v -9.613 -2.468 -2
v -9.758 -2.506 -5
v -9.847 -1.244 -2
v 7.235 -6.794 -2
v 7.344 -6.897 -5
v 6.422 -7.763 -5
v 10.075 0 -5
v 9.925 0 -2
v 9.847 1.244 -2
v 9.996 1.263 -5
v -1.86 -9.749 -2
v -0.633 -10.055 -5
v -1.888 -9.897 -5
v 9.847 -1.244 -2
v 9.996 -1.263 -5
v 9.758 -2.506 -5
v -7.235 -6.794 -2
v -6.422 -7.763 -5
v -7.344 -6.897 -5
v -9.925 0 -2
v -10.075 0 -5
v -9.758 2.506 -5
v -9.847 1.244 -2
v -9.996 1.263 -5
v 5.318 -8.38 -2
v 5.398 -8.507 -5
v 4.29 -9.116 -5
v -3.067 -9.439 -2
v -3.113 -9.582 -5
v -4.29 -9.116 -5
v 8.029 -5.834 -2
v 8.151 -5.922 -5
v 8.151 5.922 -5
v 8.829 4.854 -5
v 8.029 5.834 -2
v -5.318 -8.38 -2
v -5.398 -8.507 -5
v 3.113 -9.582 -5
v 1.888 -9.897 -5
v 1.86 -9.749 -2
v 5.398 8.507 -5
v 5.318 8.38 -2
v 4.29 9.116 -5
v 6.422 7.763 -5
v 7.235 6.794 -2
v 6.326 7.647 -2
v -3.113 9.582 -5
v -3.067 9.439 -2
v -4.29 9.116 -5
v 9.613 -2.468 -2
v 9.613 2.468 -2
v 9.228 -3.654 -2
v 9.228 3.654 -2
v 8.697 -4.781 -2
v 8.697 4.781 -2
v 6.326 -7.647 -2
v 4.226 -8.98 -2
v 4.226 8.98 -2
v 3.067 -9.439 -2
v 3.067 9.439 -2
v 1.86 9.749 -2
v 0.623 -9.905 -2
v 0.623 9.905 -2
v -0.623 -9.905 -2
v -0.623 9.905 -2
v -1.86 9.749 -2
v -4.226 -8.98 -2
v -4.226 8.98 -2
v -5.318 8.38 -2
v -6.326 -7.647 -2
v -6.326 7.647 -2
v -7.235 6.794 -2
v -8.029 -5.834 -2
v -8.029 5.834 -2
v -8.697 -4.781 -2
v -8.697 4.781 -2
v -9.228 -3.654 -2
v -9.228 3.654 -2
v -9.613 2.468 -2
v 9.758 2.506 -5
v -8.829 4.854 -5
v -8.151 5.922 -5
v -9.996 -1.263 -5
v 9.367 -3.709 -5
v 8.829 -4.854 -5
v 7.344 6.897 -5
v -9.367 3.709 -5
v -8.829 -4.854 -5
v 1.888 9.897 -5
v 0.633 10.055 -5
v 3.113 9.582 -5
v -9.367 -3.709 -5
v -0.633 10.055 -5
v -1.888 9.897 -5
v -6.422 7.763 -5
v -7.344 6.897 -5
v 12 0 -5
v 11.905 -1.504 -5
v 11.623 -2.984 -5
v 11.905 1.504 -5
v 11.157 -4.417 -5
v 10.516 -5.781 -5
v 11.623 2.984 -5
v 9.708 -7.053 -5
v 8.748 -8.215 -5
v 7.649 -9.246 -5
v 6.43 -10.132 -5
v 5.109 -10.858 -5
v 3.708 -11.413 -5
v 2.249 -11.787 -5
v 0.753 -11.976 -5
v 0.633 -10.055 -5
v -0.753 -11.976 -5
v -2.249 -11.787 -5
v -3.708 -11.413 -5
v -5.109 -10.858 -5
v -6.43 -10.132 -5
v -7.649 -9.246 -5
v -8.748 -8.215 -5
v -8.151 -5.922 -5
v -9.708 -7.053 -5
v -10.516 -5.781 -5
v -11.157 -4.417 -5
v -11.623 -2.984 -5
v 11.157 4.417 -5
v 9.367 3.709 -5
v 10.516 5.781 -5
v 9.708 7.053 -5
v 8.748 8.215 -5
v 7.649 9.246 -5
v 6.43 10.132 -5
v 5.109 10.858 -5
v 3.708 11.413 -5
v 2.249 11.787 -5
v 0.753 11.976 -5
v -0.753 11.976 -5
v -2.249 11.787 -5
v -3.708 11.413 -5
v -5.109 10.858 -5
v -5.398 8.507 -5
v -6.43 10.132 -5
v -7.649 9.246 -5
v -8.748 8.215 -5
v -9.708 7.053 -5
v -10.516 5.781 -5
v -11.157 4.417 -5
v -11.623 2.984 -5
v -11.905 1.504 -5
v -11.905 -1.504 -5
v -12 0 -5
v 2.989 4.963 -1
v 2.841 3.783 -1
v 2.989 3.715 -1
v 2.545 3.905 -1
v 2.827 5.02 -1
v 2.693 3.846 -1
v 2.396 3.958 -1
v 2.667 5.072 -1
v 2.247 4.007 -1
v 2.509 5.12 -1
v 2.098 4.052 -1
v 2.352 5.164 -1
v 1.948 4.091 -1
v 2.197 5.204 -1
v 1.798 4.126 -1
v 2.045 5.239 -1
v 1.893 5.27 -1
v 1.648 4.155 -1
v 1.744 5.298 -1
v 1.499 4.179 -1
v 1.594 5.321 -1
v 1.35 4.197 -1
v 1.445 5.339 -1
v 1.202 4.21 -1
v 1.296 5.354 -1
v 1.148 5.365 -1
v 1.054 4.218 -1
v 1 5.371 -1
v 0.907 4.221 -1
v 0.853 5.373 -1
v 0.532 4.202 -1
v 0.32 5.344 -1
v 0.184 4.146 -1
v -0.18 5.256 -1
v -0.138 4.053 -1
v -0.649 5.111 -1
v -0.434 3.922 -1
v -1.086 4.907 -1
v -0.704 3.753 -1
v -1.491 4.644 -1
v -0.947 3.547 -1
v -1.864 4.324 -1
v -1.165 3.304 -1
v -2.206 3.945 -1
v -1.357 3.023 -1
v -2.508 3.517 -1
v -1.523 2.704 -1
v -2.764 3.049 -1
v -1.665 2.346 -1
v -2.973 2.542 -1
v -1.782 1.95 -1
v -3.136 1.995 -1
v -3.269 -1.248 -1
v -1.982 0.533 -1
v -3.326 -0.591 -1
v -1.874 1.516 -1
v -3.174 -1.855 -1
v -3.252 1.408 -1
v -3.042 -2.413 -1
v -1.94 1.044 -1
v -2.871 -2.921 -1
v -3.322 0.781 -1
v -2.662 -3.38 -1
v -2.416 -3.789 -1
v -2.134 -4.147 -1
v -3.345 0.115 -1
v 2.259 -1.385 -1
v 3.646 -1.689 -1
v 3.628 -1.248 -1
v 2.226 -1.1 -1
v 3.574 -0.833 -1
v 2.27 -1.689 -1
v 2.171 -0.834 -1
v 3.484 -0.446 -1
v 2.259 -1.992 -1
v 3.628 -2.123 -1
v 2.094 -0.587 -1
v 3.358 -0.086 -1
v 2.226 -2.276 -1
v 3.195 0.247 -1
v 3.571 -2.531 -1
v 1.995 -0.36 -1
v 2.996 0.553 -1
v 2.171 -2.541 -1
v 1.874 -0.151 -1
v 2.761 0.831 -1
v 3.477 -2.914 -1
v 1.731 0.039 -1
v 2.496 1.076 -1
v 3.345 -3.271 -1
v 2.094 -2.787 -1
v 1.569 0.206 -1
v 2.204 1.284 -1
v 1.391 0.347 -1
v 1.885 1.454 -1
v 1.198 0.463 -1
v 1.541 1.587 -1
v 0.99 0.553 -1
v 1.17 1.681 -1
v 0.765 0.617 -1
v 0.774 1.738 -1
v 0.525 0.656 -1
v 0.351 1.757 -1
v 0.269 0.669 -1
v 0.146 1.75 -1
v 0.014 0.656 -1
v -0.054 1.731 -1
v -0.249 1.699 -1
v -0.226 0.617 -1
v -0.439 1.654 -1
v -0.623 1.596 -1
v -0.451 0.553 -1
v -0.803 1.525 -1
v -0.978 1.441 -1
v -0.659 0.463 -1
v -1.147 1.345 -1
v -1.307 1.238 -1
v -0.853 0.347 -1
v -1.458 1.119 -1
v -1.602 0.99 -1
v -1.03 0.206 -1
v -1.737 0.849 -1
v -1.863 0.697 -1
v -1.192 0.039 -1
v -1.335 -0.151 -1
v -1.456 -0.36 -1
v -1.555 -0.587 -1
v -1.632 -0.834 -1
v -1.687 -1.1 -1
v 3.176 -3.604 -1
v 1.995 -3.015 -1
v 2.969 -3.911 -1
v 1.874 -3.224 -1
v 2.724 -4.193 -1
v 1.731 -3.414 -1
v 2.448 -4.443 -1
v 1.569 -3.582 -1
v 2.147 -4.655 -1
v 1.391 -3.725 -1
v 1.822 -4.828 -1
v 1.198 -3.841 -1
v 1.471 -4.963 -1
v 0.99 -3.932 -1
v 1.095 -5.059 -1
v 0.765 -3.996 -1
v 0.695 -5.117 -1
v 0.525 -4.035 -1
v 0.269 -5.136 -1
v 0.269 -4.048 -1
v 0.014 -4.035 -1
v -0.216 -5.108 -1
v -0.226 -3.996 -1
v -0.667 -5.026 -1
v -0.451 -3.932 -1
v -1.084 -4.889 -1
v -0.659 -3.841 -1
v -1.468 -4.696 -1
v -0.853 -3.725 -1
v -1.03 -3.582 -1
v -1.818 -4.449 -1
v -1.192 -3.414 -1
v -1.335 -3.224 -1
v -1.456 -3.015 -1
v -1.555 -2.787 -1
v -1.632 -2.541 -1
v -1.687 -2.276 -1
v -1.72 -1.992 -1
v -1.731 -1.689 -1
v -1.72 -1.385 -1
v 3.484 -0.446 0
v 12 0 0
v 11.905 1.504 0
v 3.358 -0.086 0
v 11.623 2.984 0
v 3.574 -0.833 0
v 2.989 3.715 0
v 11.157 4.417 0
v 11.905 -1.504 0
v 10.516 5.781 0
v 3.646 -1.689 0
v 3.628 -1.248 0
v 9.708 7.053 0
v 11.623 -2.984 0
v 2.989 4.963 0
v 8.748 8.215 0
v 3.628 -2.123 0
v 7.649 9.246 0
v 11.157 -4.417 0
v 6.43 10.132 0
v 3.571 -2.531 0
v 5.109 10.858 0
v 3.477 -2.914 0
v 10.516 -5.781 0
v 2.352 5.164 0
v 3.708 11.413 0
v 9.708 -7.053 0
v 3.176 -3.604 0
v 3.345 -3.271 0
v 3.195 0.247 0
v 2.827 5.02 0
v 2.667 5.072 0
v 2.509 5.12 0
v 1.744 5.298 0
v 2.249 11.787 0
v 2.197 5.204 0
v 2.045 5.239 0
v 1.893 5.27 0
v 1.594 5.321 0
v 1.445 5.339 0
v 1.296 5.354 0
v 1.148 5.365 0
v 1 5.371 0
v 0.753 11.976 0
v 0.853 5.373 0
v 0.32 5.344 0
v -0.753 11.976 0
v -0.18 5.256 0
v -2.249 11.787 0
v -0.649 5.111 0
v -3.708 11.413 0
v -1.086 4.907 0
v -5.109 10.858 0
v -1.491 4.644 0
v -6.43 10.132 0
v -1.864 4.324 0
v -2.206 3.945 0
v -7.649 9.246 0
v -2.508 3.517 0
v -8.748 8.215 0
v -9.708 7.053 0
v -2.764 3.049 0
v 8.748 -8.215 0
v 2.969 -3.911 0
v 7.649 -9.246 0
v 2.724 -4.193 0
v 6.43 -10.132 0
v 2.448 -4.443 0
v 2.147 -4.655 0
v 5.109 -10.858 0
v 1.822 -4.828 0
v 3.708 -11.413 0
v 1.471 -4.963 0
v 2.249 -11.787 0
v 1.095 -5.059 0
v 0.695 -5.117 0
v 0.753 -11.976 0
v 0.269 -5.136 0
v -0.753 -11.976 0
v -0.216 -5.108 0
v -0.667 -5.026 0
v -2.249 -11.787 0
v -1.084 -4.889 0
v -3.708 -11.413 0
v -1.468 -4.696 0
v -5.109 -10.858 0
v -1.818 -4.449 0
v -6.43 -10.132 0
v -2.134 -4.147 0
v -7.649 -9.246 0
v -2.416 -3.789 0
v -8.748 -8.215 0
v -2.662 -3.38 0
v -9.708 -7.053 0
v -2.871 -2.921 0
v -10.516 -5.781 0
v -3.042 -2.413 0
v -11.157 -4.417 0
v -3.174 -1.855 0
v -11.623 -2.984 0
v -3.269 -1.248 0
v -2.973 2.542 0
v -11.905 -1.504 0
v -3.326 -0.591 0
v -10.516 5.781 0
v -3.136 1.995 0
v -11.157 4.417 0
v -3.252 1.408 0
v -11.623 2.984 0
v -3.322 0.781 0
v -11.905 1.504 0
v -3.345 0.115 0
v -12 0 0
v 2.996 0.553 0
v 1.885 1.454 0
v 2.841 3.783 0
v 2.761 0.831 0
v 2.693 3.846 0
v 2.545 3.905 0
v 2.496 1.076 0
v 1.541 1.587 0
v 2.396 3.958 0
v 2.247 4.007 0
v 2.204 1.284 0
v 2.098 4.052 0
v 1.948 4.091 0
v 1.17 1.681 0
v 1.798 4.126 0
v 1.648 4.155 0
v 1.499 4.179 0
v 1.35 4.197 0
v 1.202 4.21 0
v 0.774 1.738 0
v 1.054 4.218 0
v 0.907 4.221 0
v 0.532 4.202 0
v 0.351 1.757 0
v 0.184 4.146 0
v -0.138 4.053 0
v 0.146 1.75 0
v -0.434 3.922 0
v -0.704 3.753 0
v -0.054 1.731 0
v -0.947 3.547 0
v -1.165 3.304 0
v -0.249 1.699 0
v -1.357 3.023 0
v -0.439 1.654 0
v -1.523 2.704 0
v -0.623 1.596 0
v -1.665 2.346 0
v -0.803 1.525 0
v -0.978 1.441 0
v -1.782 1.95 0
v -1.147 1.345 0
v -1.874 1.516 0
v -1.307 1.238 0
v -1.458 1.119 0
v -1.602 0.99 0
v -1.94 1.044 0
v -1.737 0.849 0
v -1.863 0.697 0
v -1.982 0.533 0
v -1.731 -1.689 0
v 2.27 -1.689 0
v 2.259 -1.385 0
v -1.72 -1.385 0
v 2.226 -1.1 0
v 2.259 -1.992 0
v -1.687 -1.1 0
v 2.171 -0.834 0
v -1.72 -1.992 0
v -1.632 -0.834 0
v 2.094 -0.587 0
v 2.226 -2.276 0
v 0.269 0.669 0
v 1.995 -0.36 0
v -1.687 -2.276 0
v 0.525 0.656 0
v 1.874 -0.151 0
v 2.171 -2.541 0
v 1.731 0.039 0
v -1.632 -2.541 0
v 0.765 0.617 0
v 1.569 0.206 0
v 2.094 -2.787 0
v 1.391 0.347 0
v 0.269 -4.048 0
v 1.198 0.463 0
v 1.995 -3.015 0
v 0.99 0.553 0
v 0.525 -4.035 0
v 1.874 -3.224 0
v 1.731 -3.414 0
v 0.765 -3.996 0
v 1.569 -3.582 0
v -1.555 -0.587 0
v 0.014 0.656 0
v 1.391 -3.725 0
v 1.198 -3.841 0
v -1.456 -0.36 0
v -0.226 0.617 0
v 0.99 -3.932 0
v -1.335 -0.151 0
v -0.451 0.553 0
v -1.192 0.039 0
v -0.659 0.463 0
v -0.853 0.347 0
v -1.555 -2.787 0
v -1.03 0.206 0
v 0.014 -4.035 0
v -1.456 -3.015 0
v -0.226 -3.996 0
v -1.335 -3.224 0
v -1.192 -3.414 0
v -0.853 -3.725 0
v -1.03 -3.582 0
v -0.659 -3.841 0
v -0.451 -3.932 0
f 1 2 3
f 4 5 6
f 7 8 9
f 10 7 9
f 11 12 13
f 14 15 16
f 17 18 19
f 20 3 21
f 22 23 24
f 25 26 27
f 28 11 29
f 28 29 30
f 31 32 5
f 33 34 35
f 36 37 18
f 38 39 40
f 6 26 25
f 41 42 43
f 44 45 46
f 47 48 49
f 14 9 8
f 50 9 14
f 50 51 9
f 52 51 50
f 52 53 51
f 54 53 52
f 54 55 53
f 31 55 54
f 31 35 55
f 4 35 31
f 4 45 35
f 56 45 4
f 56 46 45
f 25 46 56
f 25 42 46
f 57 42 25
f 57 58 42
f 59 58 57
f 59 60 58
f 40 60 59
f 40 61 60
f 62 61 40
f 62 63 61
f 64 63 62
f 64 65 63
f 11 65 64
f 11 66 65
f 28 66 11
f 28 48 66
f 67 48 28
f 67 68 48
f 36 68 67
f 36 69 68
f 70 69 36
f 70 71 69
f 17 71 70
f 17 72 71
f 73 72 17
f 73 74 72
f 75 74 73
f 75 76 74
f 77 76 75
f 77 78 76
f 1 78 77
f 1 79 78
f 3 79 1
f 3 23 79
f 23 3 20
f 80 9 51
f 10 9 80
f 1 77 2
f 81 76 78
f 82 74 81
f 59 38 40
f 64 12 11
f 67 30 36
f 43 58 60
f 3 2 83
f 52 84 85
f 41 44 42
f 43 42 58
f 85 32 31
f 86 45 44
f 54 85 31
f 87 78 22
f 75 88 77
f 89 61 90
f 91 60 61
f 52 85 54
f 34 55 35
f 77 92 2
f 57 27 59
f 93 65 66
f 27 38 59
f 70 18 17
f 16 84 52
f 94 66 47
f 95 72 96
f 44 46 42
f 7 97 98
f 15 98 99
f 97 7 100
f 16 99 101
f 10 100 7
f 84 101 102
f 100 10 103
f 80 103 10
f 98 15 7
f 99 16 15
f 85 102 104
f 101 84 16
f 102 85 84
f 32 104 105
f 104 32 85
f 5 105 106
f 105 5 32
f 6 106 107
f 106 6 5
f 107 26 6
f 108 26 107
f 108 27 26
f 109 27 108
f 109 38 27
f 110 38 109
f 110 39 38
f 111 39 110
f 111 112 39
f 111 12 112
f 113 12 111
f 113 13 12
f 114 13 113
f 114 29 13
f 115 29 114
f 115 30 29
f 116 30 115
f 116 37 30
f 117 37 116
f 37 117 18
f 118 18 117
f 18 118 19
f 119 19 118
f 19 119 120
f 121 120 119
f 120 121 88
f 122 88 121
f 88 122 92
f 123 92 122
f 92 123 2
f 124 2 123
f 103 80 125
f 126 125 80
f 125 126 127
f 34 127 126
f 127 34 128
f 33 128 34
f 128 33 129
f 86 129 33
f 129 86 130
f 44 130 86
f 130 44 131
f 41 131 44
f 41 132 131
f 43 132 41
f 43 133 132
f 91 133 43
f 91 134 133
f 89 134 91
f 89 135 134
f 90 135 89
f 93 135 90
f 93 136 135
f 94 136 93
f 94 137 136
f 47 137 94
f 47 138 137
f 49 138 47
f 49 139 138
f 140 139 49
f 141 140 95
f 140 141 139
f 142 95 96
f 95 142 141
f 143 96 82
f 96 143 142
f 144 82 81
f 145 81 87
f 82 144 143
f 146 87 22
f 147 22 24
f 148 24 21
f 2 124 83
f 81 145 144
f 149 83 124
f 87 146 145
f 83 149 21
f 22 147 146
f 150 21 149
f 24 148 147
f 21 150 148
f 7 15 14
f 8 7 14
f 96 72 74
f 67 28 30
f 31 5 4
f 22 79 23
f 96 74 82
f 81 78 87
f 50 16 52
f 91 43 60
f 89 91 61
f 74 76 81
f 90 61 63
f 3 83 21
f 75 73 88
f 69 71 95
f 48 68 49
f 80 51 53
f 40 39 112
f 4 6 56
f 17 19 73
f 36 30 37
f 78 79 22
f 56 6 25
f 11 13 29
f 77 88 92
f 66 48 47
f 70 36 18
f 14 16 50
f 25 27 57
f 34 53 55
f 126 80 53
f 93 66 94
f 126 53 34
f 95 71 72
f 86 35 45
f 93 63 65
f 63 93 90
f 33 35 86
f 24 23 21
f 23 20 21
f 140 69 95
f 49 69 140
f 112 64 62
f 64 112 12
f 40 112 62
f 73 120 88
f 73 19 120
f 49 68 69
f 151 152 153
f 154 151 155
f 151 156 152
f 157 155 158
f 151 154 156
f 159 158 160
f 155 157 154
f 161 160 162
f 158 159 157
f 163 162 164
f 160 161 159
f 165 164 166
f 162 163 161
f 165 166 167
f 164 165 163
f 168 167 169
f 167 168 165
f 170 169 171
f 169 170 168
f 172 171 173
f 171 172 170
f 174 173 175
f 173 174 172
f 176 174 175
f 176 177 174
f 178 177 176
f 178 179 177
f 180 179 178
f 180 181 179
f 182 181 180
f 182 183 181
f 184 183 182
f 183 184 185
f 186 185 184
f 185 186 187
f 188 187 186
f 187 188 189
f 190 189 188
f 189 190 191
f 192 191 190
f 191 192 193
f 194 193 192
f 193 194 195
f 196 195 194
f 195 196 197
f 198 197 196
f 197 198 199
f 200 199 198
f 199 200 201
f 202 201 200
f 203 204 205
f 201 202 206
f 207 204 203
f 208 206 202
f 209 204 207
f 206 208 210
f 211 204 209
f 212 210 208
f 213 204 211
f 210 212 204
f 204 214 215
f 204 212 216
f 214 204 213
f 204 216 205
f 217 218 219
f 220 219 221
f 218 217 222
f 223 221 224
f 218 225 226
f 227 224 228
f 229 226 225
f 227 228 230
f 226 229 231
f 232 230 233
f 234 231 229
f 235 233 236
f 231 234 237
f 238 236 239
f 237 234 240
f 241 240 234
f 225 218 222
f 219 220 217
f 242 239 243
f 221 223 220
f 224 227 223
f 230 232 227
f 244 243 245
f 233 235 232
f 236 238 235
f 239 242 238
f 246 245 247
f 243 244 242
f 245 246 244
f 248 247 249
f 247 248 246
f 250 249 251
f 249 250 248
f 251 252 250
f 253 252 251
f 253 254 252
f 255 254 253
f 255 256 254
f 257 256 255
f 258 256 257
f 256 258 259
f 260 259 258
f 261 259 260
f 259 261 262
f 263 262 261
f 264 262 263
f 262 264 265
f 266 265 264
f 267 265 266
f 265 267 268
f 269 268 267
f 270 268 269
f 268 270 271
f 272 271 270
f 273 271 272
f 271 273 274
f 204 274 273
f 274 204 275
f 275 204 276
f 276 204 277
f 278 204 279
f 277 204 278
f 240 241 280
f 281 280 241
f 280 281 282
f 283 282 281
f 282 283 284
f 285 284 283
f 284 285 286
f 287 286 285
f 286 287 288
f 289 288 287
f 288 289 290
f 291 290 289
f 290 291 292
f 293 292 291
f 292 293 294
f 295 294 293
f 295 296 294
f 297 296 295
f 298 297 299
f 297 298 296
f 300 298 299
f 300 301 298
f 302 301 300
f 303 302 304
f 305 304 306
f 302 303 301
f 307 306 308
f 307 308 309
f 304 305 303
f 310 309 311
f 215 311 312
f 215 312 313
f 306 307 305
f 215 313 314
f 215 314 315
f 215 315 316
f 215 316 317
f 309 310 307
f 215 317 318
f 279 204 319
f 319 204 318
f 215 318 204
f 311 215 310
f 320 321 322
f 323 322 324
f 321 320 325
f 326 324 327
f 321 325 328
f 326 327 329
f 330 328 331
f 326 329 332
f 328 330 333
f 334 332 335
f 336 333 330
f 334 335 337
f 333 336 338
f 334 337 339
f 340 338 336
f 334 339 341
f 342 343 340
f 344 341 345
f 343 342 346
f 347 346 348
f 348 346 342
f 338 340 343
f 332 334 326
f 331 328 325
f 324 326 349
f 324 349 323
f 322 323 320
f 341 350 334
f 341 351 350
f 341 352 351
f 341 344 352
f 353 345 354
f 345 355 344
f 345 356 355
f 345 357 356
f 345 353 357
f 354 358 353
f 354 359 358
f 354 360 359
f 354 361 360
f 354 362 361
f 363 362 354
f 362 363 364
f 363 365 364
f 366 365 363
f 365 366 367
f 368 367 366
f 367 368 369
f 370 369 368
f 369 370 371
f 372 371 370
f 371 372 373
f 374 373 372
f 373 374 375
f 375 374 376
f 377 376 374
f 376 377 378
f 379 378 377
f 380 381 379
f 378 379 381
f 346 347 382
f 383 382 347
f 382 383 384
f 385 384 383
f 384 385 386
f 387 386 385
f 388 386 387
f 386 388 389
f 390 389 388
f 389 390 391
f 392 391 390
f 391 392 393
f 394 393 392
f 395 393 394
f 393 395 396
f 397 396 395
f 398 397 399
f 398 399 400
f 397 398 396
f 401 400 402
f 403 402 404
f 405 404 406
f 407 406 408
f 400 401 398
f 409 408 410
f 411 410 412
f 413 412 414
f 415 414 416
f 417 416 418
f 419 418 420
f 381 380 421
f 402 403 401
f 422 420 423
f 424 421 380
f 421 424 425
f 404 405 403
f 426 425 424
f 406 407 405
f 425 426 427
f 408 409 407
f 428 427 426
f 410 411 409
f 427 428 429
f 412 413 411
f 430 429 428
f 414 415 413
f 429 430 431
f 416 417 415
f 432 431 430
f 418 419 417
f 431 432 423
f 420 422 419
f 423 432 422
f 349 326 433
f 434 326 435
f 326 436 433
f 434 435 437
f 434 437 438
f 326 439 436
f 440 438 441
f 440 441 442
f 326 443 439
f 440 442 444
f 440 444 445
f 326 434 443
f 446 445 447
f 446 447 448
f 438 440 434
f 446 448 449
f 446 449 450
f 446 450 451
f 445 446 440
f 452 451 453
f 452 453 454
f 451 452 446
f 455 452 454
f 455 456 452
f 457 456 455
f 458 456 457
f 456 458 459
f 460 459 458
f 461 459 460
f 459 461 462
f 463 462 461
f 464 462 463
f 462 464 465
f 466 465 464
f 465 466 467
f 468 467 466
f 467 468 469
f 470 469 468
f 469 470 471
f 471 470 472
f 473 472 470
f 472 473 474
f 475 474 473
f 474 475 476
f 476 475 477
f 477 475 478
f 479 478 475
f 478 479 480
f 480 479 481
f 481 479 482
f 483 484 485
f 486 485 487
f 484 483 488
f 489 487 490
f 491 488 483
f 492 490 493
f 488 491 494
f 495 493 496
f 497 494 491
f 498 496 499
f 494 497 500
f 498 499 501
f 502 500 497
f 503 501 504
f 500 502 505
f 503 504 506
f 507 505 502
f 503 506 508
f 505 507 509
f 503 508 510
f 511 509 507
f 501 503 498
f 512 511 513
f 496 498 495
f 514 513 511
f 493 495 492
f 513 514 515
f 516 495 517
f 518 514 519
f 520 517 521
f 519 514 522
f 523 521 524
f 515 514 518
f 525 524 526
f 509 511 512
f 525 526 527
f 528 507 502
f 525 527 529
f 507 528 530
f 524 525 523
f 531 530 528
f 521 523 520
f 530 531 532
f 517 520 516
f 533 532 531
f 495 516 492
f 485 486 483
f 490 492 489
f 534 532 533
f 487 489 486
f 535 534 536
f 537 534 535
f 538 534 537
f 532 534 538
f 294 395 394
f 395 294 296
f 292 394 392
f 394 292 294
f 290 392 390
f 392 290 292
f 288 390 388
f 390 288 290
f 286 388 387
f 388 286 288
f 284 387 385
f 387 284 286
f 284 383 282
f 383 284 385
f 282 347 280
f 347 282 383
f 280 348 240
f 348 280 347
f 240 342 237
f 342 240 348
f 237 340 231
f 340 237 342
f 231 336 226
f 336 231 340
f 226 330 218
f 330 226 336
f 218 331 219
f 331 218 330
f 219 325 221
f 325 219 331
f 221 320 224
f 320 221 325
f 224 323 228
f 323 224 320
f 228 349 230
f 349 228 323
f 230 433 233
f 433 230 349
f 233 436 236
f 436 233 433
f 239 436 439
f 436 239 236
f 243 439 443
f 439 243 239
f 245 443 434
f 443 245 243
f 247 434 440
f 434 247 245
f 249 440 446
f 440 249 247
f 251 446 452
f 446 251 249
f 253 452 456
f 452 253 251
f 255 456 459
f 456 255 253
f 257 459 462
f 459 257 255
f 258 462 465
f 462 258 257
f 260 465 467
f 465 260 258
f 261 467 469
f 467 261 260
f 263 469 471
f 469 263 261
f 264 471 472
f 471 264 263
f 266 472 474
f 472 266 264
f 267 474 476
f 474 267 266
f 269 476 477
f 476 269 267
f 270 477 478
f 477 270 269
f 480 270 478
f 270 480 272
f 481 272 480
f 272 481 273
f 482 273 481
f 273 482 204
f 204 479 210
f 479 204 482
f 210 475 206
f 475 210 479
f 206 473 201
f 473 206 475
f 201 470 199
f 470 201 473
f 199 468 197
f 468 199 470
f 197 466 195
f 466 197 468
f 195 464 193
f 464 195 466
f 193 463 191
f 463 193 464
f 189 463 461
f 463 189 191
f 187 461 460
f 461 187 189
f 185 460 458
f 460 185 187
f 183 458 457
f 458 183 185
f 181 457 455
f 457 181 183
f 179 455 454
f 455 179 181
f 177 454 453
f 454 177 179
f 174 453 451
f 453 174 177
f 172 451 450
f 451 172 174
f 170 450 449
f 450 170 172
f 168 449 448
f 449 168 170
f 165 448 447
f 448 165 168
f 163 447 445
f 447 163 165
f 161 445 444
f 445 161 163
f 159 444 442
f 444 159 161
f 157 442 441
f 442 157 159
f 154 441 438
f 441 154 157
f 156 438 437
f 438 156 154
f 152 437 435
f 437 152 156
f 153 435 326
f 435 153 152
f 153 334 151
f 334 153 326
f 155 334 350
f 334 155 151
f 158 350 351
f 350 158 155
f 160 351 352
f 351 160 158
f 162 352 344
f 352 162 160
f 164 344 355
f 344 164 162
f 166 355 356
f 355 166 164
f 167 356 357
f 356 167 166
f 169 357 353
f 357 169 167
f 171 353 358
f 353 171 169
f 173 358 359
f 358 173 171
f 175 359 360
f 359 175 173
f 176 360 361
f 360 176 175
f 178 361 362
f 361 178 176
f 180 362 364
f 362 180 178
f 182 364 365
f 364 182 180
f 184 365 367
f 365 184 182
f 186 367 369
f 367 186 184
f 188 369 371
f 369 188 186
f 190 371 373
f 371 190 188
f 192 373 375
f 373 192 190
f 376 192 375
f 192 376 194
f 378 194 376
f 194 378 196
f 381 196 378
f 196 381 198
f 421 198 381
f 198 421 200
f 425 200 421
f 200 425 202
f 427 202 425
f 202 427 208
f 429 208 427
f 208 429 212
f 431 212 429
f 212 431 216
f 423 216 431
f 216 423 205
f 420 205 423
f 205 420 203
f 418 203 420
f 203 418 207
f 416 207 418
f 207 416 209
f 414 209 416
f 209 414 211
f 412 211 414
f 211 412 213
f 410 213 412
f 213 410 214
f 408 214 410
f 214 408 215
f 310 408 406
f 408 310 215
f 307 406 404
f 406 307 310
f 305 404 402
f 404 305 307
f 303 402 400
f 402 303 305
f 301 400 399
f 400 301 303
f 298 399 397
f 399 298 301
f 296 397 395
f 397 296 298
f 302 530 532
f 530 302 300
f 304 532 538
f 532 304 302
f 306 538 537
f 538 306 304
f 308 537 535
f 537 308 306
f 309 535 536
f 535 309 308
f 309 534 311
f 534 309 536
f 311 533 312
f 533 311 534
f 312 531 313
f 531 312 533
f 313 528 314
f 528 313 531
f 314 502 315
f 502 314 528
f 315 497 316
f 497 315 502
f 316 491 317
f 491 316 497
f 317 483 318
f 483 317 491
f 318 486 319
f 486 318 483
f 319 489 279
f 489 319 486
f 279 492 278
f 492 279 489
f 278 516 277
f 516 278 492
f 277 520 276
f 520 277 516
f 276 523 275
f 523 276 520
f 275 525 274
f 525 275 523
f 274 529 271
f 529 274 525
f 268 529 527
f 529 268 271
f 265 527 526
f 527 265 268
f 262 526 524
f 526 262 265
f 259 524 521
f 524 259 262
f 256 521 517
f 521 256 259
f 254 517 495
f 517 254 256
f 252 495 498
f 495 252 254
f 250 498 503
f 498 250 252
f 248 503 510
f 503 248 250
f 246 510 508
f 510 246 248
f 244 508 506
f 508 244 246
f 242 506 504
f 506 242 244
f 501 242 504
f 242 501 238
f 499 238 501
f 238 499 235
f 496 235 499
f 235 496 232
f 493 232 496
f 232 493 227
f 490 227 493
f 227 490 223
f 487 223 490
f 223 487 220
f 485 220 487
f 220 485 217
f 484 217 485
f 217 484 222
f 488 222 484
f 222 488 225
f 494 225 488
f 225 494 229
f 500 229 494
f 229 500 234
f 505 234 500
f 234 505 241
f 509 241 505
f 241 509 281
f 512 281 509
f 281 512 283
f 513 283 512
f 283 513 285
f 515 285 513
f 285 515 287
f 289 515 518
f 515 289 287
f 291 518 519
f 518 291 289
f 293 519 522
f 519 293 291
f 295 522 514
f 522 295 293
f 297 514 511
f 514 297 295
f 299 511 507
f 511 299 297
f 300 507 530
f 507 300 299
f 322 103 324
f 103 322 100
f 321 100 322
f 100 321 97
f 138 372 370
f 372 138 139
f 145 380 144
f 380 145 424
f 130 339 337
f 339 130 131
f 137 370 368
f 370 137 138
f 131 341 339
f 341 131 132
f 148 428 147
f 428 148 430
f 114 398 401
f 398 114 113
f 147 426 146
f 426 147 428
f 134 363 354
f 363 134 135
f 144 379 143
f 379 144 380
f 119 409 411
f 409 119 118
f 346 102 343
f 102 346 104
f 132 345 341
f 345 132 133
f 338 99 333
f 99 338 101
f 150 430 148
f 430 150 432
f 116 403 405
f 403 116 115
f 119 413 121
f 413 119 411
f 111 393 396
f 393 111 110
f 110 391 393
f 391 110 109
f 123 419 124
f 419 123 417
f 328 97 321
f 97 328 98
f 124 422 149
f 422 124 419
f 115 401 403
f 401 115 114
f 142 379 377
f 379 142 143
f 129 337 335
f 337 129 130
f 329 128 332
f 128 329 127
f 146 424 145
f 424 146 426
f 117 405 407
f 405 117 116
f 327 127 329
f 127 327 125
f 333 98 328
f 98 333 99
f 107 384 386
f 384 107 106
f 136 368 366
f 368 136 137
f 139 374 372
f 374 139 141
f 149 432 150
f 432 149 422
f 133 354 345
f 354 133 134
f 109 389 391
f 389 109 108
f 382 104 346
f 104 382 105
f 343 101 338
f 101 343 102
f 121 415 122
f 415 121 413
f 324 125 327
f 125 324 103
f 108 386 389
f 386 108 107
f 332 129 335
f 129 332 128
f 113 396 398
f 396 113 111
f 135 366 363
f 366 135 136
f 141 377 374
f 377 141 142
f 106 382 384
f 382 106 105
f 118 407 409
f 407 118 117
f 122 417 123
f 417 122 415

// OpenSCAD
$fn = 50;

difference() {
	union() {
		translate(v = [0, 0, -5.0]) {
			cylinder(h = 5, r = 12.0);
		}
	}
	union() {
		#translate(v = [0, 0, -5.0]) {
			cylinder(h = 3, r1 = 10.075, r2 = 9.925);
		}
		translate(v = [0, 0, -1]) {
			linear_extrude(height = 1) {
				text(font = "Impact", halign = "center", size = 10, text = "6", valign = "center");
			}
		}
	}
}
